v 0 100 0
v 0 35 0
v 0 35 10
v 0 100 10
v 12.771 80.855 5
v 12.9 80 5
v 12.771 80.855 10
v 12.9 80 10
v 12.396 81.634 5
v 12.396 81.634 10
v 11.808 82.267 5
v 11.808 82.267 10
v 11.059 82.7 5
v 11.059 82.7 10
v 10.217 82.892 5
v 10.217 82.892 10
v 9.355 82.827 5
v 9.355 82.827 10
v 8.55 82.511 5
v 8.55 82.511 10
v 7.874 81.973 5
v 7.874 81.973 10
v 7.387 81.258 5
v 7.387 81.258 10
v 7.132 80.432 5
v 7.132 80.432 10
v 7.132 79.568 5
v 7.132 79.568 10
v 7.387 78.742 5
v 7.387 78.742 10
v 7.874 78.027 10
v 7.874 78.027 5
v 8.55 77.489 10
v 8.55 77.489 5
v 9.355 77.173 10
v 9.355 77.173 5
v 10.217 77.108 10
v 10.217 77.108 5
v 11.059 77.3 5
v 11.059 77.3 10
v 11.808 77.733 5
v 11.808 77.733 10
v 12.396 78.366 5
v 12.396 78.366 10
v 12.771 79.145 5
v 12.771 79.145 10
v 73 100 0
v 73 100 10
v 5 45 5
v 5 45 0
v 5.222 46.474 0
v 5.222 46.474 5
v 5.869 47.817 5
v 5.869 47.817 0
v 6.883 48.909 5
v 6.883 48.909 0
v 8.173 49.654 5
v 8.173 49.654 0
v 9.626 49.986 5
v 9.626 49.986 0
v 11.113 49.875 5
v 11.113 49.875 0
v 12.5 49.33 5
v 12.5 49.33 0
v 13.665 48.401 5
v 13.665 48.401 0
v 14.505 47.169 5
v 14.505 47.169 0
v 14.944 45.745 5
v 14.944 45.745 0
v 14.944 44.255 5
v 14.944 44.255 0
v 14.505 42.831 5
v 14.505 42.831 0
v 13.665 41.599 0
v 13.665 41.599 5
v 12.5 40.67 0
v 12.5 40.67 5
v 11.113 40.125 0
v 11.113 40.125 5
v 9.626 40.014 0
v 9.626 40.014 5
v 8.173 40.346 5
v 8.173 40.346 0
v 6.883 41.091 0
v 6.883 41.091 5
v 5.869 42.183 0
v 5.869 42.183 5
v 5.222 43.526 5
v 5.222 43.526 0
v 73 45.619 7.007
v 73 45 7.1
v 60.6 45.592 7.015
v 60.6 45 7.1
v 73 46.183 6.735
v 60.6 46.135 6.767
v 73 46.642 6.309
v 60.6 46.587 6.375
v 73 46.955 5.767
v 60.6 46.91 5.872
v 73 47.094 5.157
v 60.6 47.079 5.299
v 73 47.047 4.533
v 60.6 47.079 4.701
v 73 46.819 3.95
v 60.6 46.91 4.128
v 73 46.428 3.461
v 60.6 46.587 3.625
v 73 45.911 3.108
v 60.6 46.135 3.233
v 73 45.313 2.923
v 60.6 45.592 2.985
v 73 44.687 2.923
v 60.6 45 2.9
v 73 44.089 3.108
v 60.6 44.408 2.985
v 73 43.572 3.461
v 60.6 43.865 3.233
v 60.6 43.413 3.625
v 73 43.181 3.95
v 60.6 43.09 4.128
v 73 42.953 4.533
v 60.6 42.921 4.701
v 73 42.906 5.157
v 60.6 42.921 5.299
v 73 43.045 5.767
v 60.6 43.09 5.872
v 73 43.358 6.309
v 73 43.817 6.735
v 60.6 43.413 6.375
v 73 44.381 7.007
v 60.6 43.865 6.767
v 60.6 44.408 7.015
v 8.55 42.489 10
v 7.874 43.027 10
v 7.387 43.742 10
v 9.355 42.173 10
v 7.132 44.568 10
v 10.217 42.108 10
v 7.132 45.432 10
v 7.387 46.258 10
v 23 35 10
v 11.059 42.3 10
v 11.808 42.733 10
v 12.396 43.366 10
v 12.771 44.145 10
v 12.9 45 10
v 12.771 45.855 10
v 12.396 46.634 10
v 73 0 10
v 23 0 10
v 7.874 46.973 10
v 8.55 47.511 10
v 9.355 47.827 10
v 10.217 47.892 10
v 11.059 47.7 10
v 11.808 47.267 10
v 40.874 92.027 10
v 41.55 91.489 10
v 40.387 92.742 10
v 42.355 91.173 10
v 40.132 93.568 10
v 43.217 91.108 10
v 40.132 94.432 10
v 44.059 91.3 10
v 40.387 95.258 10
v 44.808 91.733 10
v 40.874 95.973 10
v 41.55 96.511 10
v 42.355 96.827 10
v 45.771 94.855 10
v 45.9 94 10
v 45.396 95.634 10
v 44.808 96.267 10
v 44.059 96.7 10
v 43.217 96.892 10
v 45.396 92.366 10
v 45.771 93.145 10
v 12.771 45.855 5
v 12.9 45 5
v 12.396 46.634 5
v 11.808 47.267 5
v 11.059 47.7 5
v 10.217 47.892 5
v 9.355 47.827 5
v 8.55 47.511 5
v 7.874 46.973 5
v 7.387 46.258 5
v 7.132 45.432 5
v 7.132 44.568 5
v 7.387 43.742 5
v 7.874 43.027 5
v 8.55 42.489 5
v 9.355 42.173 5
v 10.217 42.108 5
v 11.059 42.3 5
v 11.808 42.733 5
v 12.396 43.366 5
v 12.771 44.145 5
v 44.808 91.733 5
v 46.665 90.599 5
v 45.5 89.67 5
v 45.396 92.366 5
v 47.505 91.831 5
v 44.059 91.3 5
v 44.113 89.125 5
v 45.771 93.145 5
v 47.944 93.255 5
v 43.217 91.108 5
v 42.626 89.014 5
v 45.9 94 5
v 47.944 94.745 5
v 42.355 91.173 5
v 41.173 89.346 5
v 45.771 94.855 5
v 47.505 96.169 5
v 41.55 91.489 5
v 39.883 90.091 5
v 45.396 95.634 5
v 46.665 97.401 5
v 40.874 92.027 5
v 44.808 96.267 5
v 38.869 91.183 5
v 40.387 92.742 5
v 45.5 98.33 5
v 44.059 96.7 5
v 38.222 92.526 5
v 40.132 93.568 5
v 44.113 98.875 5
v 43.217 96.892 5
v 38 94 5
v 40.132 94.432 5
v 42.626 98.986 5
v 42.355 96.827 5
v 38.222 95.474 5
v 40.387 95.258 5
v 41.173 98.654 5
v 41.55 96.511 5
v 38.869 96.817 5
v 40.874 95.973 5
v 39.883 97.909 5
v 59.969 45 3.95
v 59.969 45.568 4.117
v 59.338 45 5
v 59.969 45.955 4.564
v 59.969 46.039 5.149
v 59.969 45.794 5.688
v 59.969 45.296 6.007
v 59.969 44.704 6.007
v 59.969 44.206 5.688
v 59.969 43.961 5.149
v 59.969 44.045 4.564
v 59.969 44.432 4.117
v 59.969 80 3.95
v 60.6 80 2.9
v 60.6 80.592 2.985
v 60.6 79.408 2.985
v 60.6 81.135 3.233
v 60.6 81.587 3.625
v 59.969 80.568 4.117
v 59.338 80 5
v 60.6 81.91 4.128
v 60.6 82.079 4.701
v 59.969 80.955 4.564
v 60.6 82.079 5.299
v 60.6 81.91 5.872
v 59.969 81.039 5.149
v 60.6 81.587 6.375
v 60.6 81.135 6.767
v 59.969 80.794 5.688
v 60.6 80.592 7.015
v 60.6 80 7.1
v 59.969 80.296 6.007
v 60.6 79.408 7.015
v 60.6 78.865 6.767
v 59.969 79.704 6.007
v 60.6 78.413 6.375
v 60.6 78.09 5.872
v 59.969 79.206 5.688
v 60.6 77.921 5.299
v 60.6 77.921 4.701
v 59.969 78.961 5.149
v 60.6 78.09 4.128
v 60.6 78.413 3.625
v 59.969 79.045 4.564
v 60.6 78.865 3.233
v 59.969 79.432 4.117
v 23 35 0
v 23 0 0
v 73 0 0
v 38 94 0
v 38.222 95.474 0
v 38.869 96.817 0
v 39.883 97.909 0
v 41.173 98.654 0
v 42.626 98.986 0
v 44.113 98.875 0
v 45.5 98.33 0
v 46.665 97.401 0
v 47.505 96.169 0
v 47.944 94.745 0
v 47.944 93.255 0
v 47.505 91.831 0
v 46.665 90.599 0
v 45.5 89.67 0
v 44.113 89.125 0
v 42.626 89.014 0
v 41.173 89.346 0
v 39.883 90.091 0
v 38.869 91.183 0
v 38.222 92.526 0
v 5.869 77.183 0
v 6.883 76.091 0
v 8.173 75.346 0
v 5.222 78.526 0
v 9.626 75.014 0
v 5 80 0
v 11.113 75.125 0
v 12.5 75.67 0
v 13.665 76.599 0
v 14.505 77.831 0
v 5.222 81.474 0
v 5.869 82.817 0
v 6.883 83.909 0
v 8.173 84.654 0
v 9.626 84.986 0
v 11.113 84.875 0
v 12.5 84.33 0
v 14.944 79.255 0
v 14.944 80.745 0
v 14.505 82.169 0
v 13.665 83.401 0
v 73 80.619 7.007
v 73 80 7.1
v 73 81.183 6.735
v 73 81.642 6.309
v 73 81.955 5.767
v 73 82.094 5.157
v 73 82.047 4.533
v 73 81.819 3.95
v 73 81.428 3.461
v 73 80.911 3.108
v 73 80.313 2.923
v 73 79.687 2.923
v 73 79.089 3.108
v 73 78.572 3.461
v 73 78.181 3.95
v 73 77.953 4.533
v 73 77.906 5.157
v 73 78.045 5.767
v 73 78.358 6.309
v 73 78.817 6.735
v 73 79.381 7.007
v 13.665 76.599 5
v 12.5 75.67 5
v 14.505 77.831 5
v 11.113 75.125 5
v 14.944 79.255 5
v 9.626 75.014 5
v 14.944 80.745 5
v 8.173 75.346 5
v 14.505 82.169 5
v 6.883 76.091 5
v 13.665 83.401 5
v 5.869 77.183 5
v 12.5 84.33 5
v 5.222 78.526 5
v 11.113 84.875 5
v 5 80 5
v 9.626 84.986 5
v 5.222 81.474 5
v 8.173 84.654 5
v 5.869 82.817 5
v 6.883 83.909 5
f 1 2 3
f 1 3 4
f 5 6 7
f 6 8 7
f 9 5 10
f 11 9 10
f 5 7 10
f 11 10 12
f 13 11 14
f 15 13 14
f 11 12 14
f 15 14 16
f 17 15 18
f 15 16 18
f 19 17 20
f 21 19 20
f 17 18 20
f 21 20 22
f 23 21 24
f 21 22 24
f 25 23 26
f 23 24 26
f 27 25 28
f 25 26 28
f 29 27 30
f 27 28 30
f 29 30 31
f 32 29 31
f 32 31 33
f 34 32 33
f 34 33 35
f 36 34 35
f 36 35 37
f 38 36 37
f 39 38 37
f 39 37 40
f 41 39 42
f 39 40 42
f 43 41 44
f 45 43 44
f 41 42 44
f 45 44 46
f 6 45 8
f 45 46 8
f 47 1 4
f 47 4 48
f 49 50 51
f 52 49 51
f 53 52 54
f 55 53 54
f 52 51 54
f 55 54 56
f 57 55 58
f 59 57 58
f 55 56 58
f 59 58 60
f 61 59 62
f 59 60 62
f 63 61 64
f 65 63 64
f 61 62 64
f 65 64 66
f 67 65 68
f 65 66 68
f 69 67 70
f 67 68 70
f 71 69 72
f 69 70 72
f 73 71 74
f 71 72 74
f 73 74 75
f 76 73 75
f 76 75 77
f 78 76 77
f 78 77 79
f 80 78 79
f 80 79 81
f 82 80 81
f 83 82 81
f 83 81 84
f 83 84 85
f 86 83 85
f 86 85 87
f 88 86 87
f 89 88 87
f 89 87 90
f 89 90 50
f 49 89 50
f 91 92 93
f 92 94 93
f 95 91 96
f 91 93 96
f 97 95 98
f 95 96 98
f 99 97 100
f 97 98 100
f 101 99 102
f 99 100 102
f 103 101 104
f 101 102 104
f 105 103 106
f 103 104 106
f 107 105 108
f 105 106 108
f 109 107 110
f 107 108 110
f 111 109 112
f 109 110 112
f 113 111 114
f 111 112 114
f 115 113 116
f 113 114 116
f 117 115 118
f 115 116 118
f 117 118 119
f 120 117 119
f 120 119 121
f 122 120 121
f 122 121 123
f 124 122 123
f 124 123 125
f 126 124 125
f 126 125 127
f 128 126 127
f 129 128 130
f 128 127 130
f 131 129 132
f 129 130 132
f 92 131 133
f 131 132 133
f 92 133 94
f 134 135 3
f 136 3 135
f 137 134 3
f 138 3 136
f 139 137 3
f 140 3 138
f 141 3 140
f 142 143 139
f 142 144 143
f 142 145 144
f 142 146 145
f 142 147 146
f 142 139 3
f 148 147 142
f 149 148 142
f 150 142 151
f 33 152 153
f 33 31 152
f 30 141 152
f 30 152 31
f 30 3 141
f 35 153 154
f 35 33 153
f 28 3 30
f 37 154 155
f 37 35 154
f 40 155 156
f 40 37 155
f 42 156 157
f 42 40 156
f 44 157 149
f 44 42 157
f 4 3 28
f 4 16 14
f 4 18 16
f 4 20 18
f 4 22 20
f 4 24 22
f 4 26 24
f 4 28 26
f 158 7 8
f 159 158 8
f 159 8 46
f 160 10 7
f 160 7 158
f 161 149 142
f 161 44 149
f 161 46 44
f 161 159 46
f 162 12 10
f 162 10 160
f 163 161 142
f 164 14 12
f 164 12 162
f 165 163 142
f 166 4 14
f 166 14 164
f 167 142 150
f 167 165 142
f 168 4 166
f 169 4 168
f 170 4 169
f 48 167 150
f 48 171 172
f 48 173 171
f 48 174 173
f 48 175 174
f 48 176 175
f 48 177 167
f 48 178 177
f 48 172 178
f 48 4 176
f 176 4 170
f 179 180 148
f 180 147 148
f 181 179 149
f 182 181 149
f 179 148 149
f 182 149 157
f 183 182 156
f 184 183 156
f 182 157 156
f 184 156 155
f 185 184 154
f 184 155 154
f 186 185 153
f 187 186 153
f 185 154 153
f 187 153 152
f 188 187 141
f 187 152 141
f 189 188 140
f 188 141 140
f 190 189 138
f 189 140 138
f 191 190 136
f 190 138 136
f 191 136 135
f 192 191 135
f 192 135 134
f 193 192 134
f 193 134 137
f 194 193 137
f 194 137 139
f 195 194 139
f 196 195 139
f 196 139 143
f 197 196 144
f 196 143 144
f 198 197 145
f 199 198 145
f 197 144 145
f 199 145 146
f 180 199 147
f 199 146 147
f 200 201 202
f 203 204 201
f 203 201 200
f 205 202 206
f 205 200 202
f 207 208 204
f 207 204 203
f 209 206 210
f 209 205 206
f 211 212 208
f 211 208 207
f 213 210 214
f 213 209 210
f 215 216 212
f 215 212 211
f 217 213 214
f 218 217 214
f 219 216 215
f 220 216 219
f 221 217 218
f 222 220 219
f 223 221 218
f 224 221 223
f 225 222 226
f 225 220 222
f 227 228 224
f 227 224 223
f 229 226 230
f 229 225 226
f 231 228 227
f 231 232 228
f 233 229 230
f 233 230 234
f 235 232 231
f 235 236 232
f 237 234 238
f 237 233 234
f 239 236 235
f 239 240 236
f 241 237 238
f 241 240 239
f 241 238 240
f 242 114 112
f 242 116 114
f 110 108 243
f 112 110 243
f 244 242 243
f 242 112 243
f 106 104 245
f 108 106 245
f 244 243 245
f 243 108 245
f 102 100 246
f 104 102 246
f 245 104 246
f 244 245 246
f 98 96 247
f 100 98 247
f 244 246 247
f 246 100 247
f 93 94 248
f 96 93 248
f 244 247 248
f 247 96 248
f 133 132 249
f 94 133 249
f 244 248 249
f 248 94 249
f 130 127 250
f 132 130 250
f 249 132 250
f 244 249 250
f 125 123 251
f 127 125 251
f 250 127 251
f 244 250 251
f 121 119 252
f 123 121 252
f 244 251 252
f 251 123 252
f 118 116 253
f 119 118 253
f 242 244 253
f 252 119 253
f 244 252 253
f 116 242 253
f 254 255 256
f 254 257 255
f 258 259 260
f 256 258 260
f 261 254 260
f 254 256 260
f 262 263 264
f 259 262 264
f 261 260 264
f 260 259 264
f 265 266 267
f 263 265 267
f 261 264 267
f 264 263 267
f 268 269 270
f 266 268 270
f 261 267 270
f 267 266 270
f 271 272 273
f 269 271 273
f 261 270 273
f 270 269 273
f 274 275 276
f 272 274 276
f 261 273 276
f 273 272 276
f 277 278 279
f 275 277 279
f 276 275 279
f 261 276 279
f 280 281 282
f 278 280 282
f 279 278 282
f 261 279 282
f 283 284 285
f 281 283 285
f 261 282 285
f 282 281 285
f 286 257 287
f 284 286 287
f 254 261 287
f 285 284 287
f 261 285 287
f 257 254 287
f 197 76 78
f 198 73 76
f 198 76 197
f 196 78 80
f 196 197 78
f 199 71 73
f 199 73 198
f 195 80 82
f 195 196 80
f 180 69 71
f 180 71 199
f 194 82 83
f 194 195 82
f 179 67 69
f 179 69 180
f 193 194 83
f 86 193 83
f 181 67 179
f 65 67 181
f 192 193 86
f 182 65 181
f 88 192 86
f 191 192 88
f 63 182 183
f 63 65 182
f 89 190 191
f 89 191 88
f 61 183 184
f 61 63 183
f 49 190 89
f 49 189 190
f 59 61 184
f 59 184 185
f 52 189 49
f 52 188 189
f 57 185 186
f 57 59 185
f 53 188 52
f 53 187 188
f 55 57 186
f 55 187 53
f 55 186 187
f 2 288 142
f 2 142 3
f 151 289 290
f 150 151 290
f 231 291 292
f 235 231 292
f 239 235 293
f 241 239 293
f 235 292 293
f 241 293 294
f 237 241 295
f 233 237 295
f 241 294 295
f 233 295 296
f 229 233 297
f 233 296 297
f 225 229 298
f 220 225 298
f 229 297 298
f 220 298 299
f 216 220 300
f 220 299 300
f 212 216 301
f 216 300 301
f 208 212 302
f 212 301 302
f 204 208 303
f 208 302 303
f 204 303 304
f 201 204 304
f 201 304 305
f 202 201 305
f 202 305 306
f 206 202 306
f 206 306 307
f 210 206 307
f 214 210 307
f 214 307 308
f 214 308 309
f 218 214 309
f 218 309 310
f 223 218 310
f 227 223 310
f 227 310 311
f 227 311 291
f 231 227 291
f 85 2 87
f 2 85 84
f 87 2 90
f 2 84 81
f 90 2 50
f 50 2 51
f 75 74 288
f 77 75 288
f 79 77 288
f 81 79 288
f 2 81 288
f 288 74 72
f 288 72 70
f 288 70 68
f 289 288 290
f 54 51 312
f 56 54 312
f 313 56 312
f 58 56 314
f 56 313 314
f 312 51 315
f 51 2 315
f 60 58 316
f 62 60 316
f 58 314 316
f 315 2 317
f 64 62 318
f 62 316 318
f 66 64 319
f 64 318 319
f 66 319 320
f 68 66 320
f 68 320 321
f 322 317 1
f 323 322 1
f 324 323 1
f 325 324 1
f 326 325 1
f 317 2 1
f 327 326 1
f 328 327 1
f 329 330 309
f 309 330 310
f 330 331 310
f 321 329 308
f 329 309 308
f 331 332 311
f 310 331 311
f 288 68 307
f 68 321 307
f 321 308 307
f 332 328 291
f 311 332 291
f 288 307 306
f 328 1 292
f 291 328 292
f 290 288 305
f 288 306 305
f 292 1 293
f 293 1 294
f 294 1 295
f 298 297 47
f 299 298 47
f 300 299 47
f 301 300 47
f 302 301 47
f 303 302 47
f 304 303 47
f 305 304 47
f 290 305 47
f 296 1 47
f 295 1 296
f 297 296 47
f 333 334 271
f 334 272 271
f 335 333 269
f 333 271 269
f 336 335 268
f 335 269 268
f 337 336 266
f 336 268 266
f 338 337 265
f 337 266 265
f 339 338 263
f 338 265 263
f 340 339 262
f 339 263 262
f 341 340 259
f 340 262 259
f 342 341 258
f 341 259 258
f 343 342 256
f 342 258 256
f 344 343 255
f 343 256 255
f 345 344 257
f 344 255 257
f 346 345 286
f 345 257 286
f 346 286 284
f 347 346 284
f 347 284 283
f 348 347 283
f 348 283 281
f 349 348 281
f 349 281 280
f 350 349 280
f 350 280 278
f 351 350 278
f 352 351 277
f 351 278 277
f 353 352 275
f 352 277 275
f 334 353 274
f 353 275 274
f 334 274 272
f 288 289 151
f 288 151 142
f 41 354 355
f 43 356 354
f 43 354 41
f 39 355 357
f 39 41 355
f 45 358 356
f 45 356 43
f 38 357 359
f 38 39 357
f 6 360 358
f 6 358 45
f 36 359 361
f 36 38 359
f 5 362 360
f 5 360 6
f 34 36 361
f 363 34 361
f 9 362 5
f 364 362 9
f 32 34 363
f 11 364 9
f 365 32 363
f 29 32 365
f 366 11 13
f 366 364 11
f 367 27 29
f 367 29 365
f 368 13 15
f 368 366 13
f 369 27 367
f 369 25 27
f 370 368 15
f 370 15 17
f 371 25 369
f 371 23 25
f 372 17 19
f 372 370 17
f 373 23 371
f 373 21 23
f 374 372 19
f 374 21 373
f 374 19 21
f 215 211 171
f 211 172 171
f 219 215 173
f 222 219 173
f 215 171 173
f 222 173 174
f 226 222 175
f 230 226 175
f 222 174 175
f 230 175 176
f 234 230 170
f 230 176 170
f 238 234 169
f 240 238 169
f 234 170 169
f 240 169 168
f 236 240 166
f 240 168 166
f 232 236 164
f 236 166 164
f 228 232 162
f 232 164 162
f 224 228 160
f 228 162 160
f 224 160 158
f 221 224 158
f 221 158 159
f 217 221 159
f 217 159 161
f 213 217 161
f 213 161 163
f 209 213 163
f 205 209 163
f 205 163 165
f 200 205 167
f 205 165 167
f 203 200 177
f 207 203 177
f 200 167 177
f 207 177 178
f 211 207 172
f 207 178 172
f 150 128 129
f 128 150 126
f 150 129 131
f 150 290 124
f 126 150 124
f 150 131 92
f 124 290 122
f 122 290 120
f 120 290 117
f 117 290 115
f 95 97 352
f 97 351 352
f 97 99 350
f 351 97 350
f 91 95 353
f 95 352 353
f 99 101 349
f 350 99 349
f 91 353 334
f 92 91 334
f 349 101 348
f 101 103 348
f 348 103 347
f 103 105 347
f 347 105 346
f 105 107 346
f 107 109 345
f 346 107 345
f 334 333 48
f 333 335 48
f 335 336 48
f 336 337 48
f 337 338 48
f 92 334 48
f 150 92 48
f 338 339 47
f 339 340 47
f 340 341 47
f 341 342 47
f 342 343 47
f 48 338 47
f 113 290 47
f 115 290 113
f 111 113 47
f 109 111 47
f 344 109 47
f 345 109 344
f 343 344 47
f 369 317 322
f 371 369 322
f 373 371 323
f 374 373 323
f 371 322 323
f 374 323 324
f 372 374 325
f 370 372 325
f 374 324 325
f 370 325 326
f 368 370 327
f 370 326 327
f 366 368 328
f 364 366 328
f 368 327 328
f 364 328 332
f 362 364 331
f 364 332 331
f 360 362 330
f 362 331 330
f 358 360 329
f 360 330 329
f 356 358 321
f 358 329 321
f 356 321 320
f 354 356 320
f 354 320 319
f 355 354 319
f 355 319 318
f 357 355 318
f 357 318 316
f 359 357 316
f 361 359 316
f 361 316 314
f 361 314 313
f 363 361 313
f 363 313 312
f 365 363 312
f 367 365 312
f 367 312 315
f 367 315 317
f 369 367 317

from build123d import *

# Parameters (mm, degrees)
SKETCH_1_W                   = 73
SKETCH_1_H                   = 100
EXTRUDE_1_DEPTH              = 10
HOLE_WIZARD_M5_1_D           = 5.8
HOLE_WIZARD_M5_1_CBORE_D     = 10
HOLE_WIZARD_M5_1_CBORE_DEPTH = 5
HOLE_WIZARD_M5_1_2_D         = 4.2
HOLE_WIZARD_M5_1_2_DEPTH     = 12.4
HOLE_WIZARD_M5_1_2_TIP       = 1.2618073
SKETCH_6_W                   = 23
SKETCH_6_H                   = 35
CUT_EXTRUDE_1_DEPTH          = 125.213525834


with BuildPart() as part:
    # 草图1 → 凸台-拉伸1 (new body)
    with BuildSketch(Plane.XY):
        with Locations((36.5, 50)):
            Rectangle(SKETCH_1_W, SKETCH_1_H)
    extrude(amount=EXTRUDE_1_DEPTH)

    # Hole Wizard M5 _1 (through all)
    with Locations(Plane(origin=(0, 0, 0), x_dir=(-1, 0, 0), z_dir=(0, 0, -1))):
        with Locations((-10, 80), (-43, 94), (-10, 45)):
            CounterBoreHole(HOLE_WIZARD_M5_1_D / 2, HOLE_WIZARD_M5_1_CBORE_D / 2, HOLE_WIZARD_M5_1_CBORE_DEPTH)

    # Hole Wizard M5 _1 2
    with Locations(Plane(origin=(73, 0, 0), x_dir=(0, 0, -1), z_dir=(1, 0, 0))):
        with Locations((-5, 80), (-5, 45)):
            Hole(HOLE_WIZARD_M5_1_2_D / 2, depth=HOLE_WIZARD_M5_1_2_DEPTH)
            with Locations((0, 0, -(HOLE_WIZARD_M5_1_2_DEPTH + HOLE_WIZARD_M5_1_2_TIP / 2))):  # 118° drill point
                Cone(0, HOLE_WIZARD_M5_1_2_D / 2, HOLE_WIZARD_M5_1_2_TIP, mode=Mode.SUBTRACT)

    # 草图6 → 切除-拉伸1 (cut, through all)
    with BuildSketch(Plane(origin=(0, 0, 0), x_dir=(-1, 0, 0), z_dir=(0, 0, -1))):
        with Locations((-11.5, 17.5)):
            Rectangle(SKETCH_6_W, SKETCH_6_H)
    extrude(amount=-CUT_EXTRUDE_1_DEPTH, mode=Mode.SUBTRACT)


solid = part.part
